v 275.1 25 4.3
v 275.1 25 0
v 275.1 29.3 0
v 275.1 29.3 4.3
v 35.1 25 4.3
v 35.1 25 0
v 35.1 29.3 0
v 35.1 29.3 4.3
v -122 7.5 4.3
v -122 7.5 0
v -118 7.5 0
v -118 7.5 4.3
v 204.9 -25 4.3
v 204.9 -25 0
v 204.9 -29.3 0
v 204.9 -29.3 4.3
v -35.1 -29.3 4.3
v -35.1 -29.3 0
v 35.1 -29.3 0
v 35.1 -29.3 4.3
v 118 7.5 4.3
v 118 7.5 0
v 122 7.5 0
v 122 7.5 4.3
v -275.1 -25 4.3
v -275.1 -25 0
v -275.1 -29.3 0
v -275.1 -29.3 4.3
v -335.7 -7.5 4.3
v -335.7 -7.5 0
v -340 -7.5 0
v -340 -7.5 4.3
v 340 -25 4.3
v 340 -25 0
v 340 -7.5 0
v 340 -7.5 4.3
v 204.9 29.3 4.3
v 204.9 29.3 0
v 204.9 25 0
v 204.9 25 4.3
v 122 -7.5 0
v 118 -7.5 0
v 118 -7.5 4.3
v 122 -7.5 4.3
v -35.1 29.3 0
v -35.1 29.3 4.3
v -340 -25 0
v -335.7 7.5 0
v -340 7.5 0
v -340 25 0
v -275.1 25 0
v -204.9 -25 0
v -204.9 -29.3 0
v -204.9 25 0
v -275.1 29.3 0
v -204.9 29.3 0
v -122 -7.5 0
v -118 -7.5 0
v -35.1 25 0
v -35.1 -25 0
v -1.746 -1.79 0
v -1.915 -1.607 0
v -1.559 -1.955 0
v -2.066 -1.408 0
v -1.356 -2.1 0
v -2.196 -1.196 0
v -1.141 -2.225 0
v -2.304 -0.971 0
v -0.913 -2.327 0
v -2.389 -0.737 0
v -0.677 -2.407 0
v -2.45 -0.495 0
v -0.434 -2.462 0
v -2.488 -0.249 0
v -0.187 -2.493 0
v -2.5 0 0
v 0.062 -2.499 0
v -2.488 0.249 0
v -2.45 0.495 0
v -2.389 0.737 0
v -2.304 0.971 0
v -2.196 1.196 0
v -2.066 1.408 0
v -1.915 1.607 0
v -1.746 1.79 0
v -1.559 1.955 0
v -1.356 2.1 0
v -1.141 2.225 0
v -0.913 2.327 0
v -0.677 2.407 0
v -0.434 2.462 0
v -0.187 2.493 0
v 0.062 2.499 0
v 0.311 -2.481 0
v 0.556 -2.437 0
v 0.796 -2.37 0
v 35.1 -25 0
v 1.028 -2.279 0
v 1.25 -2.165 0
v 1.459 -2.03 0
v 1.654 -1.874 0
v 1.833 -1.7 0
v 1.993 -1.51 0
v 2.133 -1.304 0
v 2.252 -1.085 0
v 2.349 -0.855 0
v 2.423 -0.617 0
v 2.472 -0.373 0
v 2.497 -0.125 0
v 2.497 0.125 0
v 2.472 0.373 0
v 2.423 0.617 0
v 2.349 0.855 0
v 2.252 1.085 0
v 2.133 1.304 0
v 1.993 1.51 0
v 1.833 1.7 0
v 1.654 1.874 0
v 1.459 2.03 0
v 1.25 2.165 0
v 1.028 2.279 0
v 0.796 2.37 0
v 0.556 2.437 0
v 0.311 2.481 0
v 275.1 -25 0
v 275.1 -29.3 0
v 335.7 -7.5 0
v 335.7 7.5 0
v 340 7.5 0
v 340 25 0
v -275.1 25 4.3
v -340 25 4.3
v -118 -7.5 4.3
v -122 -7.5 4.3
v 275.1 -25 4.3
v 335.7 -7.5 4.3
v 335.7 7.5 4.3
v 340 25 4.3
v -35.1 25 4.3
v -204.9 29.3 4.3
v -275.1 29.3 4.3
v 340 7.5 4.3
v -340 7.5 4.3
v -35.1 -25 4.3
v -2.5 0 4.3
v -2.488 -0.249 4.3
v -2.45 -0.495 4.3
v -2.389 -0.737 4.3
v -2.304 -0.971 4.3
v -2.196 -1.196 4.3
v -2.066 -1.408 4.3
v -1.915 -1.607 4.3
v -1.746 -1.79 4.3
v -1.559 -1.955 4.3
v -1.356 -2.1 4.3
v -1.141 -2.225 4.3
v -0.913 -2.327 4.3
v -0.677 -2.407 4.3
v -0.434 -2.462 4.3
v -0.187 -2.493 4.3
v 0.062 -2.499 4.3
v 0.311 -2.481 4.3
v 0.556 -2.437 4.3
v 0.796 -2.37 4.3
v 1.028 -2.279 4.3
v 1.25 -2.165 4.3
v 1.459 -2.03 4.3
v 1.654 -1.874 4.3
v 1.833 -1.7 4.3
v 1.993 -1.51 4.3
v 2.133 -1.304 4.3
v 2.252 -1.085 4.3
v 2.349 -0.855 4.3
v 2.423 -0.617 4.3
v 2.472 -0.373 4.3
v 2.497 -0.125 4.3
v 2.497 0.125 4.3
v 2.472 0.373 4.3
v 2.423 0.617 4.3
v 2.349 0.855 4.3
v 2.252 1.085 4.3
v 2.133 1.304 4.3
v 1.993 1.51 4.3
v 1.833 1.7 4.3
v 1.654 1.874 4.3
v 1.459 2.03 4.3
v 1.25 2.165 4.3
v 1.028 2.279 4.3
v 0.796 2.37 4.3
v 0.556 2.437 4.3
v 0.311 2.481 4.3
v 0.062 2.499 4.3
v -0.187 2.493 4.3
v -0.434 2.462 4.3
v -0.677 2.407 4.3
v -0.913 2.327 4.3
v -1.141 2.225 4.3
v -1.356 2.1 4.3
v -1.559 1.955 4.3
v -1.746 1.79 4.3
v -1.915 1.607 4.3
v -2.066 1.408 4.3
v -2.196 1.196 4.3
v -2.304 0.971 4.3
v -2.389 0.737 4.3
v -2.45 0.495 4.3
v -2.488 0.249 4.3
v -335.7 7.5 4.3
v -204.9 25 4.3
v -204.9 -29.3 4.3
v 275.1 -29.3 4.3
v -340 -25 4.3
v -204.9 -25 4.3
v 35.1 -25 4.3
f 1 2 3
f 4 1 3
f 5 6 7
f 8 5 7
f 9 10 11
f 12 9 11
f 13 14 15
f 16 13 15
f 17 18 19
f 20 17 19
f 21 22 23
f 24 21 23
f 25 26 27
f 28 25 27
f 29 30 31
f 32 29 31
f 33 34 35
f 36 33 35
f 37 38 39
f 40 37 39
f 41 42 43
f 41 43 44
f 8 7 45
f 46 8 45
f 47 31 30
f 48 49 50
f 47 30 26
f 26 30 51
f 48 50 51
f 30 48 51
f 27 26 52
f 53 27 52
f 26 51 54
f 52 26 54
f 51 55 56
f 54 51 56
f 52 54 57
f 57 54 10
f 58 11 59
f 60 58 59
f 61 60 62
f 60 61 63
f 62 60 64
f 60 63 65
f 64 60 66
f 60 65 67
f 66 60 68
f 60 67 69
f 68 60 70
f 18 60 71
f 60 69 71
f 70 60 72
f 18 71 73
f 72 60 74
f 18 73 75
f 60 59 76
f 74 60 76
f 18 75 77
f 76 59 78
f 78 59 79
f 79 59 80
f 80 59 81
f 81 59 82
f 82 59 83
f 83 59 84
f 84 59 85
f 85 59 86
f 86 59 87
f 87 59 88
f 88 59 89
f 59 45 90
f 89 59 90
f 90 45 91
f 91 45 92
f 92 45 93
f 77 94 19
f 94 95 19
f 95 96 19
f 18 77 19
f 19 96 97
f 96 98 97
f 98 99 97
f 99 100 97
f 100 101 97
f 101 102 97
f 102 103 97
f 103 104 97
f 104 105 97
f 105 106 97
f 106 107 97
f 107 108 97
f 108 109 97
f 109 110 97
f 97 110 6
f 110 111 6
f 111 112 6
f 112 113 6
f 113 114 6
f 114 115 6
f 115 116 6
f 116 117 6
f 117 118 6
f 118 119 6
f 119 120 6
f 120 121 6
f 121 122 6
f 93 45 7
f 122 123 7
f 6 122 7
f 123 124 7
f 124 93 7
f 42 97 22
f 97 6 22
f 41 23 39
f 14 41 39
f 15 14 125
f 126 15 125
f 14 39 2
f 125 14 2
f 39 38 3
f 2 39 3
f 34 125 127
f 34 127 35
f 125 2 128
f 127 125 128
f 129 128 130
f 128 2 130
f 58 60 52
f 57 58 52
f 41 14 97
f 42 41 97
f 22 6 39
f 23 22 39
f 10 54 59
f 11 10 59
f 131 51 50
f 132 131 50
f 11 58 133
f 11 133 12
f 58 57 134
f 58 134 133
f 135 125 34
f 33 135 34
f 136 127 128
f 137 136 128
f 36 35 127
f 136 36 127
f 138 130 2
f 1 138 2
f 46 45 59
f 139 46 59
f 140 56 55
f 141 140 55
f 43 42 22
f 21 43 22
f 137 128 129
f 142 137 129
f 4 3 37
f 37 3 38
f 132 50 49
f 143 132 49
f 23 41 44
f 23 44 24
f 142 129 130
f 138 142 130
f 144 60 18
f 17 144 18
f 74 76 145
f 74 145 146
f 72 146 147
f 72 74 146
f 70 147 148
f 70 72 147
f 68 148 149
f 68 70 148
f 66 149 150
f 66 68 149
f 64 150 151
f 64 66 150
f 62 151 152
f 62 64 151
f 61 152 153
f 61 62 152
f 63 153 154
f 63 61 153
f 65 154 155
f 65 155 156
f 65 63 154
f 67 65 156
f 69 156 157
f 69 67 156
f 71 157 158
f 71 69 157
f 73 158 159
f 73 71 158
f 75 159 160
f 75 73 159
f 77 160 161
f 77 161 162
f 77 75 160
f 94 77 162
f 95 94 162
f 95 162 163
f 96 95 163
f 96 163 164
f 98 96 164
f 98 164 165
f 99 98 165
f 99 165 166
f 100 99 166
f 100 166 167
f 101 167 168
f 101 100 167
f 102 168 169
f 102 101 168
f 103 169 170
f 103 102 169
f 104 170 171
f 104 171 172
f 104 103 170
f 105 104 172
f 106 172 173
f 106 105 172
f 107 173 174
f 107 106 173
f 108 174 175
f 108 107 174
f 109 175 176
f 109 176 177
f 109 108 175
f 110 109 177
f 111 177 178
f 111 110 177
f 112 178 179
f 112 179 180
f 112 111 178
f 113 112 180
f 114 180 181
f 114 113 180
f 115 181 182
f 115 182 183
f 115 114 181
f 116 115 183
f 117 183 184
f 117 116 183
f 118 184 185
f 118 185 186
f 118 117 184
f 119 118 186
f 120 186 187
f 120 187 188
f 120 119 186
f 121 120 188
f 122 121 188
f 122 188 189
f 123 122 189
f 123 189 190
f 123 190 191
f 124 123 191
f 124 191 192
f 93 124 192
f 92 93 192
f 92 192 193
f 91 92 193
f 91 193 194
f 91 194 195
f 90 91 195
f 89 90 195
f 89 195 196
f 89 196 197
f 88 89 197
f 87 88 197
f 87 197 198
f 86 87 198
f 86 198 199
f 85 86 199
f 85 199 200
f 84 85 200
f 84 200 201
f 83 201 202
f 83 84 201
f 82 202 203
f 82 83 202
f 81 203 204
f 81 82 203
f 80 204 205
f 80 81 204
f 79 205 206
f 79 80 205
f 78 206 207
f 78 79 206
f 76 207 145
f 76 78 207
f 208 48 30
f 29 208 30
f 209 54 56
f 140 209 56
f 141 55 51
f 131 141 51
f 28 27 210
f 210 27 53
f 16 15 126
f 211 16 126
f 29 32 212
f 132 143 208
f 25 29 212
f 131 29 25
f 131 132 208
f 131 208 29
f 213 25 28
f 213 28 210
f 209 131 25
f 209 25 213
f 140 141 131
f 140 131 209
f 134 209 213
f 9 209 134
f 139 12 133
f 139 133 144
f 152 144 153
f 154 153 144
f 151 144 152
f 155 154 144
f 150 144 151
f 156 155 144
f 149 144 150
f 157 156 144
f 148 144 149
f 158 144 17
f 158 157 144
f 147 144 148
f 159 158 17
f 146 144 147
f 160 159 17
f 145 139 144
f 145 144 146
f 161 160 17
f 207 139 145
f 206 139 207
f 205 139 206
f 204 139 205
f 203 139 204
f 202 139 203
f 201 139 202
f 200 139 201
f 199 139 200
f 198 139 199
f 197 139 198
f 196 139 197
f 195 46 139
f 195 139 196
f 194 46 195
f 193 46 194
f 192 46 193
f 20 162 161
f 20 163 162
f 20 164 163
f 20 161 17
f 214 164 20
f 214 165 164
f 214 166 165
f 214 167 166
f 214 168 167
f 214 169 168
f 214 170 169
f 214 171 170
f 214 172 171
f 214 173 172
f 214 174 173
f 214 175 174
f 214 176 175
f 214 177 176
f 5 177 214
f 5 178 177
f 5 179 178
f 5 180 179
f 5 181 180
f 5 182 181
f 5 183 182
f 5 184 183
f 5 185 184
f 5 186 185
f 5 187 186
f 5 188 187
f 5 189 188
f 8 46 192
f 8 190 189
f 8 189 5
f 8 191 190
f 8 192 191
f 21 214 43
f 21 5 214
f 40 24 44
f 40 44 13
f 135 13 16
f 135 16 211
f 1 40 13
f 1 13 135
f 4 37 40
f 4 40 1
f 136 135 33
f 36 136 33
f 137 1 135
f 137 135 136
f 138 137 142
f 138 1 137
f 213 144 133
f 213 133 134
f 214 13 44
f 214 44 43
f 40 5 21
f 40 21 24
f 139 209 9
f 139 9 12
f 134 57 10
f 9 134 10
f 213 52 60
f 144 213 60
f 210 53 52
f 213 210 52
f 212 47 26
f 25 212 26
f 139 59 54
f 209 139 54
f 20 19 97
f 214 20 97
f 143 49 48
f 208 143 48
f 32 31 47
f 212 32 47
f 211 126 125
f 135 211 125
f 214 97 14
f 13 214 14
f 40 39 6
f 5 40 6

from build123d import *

# Parameters (mm, degrees)
SKETCH1_R           = 2.5
SKETCH1_W           = 4
SKETCH1_H           = 15
BOSS_EXTRUDE1_DEPTH = 4.3


with BuildPart() as part:
    # Sketch1 → Boss-Extrude1 (new body)
    with BuildSketch(Plane.XY):
        Polygon((-340, -25), (-275.1, -25), (-275.1, -29.3), (-204.9, -29.3), (-204.9, -25), (-35.1, -25), (-35.1, -29.3), (35.1, -29.3), (35.1, -25), (204.9, -25), (204.9, -29.3), (275.1, -29.3), (275.1, -25), (340, -25), (340, -7.5), (335.7, -7.5), (335.7, 7.5), (340, 7.5), (340, 25), (275.1, 25), (275.1, 29.3), (204.9, 29.3), (204.9, 25), (35.1, 25), (35.1, 29.3), (-35.1, 29.3), (-35.1, 25), (-204.9, 25), (-204.9, 29.3), (-275.1, 29.3), (-275.1, 25), (-340, 25), (-340, 7.5), (-335.7, 7.5), (-335.7, -7.5), (-340, -7.5), align=None)
        with Locations(Location((0, 0, 0), (0, 0, 180))):
            Circle(SKETCH1_R, mode=Mode.SUBTRACT)
        with Locations((120, 0)):
            Rectangle(SKETCH1_W, SKETCH1_H, mode=Mode.SUBTRACT)
        with Locations((-120, 0)):
            Rectangle(SKETCH1_W, SKETCH1_H, mode=Mode.SUBTRACT)
    extrude(amount=BOSS_EXTRUDE1_DEPTH)


solid = part.part
